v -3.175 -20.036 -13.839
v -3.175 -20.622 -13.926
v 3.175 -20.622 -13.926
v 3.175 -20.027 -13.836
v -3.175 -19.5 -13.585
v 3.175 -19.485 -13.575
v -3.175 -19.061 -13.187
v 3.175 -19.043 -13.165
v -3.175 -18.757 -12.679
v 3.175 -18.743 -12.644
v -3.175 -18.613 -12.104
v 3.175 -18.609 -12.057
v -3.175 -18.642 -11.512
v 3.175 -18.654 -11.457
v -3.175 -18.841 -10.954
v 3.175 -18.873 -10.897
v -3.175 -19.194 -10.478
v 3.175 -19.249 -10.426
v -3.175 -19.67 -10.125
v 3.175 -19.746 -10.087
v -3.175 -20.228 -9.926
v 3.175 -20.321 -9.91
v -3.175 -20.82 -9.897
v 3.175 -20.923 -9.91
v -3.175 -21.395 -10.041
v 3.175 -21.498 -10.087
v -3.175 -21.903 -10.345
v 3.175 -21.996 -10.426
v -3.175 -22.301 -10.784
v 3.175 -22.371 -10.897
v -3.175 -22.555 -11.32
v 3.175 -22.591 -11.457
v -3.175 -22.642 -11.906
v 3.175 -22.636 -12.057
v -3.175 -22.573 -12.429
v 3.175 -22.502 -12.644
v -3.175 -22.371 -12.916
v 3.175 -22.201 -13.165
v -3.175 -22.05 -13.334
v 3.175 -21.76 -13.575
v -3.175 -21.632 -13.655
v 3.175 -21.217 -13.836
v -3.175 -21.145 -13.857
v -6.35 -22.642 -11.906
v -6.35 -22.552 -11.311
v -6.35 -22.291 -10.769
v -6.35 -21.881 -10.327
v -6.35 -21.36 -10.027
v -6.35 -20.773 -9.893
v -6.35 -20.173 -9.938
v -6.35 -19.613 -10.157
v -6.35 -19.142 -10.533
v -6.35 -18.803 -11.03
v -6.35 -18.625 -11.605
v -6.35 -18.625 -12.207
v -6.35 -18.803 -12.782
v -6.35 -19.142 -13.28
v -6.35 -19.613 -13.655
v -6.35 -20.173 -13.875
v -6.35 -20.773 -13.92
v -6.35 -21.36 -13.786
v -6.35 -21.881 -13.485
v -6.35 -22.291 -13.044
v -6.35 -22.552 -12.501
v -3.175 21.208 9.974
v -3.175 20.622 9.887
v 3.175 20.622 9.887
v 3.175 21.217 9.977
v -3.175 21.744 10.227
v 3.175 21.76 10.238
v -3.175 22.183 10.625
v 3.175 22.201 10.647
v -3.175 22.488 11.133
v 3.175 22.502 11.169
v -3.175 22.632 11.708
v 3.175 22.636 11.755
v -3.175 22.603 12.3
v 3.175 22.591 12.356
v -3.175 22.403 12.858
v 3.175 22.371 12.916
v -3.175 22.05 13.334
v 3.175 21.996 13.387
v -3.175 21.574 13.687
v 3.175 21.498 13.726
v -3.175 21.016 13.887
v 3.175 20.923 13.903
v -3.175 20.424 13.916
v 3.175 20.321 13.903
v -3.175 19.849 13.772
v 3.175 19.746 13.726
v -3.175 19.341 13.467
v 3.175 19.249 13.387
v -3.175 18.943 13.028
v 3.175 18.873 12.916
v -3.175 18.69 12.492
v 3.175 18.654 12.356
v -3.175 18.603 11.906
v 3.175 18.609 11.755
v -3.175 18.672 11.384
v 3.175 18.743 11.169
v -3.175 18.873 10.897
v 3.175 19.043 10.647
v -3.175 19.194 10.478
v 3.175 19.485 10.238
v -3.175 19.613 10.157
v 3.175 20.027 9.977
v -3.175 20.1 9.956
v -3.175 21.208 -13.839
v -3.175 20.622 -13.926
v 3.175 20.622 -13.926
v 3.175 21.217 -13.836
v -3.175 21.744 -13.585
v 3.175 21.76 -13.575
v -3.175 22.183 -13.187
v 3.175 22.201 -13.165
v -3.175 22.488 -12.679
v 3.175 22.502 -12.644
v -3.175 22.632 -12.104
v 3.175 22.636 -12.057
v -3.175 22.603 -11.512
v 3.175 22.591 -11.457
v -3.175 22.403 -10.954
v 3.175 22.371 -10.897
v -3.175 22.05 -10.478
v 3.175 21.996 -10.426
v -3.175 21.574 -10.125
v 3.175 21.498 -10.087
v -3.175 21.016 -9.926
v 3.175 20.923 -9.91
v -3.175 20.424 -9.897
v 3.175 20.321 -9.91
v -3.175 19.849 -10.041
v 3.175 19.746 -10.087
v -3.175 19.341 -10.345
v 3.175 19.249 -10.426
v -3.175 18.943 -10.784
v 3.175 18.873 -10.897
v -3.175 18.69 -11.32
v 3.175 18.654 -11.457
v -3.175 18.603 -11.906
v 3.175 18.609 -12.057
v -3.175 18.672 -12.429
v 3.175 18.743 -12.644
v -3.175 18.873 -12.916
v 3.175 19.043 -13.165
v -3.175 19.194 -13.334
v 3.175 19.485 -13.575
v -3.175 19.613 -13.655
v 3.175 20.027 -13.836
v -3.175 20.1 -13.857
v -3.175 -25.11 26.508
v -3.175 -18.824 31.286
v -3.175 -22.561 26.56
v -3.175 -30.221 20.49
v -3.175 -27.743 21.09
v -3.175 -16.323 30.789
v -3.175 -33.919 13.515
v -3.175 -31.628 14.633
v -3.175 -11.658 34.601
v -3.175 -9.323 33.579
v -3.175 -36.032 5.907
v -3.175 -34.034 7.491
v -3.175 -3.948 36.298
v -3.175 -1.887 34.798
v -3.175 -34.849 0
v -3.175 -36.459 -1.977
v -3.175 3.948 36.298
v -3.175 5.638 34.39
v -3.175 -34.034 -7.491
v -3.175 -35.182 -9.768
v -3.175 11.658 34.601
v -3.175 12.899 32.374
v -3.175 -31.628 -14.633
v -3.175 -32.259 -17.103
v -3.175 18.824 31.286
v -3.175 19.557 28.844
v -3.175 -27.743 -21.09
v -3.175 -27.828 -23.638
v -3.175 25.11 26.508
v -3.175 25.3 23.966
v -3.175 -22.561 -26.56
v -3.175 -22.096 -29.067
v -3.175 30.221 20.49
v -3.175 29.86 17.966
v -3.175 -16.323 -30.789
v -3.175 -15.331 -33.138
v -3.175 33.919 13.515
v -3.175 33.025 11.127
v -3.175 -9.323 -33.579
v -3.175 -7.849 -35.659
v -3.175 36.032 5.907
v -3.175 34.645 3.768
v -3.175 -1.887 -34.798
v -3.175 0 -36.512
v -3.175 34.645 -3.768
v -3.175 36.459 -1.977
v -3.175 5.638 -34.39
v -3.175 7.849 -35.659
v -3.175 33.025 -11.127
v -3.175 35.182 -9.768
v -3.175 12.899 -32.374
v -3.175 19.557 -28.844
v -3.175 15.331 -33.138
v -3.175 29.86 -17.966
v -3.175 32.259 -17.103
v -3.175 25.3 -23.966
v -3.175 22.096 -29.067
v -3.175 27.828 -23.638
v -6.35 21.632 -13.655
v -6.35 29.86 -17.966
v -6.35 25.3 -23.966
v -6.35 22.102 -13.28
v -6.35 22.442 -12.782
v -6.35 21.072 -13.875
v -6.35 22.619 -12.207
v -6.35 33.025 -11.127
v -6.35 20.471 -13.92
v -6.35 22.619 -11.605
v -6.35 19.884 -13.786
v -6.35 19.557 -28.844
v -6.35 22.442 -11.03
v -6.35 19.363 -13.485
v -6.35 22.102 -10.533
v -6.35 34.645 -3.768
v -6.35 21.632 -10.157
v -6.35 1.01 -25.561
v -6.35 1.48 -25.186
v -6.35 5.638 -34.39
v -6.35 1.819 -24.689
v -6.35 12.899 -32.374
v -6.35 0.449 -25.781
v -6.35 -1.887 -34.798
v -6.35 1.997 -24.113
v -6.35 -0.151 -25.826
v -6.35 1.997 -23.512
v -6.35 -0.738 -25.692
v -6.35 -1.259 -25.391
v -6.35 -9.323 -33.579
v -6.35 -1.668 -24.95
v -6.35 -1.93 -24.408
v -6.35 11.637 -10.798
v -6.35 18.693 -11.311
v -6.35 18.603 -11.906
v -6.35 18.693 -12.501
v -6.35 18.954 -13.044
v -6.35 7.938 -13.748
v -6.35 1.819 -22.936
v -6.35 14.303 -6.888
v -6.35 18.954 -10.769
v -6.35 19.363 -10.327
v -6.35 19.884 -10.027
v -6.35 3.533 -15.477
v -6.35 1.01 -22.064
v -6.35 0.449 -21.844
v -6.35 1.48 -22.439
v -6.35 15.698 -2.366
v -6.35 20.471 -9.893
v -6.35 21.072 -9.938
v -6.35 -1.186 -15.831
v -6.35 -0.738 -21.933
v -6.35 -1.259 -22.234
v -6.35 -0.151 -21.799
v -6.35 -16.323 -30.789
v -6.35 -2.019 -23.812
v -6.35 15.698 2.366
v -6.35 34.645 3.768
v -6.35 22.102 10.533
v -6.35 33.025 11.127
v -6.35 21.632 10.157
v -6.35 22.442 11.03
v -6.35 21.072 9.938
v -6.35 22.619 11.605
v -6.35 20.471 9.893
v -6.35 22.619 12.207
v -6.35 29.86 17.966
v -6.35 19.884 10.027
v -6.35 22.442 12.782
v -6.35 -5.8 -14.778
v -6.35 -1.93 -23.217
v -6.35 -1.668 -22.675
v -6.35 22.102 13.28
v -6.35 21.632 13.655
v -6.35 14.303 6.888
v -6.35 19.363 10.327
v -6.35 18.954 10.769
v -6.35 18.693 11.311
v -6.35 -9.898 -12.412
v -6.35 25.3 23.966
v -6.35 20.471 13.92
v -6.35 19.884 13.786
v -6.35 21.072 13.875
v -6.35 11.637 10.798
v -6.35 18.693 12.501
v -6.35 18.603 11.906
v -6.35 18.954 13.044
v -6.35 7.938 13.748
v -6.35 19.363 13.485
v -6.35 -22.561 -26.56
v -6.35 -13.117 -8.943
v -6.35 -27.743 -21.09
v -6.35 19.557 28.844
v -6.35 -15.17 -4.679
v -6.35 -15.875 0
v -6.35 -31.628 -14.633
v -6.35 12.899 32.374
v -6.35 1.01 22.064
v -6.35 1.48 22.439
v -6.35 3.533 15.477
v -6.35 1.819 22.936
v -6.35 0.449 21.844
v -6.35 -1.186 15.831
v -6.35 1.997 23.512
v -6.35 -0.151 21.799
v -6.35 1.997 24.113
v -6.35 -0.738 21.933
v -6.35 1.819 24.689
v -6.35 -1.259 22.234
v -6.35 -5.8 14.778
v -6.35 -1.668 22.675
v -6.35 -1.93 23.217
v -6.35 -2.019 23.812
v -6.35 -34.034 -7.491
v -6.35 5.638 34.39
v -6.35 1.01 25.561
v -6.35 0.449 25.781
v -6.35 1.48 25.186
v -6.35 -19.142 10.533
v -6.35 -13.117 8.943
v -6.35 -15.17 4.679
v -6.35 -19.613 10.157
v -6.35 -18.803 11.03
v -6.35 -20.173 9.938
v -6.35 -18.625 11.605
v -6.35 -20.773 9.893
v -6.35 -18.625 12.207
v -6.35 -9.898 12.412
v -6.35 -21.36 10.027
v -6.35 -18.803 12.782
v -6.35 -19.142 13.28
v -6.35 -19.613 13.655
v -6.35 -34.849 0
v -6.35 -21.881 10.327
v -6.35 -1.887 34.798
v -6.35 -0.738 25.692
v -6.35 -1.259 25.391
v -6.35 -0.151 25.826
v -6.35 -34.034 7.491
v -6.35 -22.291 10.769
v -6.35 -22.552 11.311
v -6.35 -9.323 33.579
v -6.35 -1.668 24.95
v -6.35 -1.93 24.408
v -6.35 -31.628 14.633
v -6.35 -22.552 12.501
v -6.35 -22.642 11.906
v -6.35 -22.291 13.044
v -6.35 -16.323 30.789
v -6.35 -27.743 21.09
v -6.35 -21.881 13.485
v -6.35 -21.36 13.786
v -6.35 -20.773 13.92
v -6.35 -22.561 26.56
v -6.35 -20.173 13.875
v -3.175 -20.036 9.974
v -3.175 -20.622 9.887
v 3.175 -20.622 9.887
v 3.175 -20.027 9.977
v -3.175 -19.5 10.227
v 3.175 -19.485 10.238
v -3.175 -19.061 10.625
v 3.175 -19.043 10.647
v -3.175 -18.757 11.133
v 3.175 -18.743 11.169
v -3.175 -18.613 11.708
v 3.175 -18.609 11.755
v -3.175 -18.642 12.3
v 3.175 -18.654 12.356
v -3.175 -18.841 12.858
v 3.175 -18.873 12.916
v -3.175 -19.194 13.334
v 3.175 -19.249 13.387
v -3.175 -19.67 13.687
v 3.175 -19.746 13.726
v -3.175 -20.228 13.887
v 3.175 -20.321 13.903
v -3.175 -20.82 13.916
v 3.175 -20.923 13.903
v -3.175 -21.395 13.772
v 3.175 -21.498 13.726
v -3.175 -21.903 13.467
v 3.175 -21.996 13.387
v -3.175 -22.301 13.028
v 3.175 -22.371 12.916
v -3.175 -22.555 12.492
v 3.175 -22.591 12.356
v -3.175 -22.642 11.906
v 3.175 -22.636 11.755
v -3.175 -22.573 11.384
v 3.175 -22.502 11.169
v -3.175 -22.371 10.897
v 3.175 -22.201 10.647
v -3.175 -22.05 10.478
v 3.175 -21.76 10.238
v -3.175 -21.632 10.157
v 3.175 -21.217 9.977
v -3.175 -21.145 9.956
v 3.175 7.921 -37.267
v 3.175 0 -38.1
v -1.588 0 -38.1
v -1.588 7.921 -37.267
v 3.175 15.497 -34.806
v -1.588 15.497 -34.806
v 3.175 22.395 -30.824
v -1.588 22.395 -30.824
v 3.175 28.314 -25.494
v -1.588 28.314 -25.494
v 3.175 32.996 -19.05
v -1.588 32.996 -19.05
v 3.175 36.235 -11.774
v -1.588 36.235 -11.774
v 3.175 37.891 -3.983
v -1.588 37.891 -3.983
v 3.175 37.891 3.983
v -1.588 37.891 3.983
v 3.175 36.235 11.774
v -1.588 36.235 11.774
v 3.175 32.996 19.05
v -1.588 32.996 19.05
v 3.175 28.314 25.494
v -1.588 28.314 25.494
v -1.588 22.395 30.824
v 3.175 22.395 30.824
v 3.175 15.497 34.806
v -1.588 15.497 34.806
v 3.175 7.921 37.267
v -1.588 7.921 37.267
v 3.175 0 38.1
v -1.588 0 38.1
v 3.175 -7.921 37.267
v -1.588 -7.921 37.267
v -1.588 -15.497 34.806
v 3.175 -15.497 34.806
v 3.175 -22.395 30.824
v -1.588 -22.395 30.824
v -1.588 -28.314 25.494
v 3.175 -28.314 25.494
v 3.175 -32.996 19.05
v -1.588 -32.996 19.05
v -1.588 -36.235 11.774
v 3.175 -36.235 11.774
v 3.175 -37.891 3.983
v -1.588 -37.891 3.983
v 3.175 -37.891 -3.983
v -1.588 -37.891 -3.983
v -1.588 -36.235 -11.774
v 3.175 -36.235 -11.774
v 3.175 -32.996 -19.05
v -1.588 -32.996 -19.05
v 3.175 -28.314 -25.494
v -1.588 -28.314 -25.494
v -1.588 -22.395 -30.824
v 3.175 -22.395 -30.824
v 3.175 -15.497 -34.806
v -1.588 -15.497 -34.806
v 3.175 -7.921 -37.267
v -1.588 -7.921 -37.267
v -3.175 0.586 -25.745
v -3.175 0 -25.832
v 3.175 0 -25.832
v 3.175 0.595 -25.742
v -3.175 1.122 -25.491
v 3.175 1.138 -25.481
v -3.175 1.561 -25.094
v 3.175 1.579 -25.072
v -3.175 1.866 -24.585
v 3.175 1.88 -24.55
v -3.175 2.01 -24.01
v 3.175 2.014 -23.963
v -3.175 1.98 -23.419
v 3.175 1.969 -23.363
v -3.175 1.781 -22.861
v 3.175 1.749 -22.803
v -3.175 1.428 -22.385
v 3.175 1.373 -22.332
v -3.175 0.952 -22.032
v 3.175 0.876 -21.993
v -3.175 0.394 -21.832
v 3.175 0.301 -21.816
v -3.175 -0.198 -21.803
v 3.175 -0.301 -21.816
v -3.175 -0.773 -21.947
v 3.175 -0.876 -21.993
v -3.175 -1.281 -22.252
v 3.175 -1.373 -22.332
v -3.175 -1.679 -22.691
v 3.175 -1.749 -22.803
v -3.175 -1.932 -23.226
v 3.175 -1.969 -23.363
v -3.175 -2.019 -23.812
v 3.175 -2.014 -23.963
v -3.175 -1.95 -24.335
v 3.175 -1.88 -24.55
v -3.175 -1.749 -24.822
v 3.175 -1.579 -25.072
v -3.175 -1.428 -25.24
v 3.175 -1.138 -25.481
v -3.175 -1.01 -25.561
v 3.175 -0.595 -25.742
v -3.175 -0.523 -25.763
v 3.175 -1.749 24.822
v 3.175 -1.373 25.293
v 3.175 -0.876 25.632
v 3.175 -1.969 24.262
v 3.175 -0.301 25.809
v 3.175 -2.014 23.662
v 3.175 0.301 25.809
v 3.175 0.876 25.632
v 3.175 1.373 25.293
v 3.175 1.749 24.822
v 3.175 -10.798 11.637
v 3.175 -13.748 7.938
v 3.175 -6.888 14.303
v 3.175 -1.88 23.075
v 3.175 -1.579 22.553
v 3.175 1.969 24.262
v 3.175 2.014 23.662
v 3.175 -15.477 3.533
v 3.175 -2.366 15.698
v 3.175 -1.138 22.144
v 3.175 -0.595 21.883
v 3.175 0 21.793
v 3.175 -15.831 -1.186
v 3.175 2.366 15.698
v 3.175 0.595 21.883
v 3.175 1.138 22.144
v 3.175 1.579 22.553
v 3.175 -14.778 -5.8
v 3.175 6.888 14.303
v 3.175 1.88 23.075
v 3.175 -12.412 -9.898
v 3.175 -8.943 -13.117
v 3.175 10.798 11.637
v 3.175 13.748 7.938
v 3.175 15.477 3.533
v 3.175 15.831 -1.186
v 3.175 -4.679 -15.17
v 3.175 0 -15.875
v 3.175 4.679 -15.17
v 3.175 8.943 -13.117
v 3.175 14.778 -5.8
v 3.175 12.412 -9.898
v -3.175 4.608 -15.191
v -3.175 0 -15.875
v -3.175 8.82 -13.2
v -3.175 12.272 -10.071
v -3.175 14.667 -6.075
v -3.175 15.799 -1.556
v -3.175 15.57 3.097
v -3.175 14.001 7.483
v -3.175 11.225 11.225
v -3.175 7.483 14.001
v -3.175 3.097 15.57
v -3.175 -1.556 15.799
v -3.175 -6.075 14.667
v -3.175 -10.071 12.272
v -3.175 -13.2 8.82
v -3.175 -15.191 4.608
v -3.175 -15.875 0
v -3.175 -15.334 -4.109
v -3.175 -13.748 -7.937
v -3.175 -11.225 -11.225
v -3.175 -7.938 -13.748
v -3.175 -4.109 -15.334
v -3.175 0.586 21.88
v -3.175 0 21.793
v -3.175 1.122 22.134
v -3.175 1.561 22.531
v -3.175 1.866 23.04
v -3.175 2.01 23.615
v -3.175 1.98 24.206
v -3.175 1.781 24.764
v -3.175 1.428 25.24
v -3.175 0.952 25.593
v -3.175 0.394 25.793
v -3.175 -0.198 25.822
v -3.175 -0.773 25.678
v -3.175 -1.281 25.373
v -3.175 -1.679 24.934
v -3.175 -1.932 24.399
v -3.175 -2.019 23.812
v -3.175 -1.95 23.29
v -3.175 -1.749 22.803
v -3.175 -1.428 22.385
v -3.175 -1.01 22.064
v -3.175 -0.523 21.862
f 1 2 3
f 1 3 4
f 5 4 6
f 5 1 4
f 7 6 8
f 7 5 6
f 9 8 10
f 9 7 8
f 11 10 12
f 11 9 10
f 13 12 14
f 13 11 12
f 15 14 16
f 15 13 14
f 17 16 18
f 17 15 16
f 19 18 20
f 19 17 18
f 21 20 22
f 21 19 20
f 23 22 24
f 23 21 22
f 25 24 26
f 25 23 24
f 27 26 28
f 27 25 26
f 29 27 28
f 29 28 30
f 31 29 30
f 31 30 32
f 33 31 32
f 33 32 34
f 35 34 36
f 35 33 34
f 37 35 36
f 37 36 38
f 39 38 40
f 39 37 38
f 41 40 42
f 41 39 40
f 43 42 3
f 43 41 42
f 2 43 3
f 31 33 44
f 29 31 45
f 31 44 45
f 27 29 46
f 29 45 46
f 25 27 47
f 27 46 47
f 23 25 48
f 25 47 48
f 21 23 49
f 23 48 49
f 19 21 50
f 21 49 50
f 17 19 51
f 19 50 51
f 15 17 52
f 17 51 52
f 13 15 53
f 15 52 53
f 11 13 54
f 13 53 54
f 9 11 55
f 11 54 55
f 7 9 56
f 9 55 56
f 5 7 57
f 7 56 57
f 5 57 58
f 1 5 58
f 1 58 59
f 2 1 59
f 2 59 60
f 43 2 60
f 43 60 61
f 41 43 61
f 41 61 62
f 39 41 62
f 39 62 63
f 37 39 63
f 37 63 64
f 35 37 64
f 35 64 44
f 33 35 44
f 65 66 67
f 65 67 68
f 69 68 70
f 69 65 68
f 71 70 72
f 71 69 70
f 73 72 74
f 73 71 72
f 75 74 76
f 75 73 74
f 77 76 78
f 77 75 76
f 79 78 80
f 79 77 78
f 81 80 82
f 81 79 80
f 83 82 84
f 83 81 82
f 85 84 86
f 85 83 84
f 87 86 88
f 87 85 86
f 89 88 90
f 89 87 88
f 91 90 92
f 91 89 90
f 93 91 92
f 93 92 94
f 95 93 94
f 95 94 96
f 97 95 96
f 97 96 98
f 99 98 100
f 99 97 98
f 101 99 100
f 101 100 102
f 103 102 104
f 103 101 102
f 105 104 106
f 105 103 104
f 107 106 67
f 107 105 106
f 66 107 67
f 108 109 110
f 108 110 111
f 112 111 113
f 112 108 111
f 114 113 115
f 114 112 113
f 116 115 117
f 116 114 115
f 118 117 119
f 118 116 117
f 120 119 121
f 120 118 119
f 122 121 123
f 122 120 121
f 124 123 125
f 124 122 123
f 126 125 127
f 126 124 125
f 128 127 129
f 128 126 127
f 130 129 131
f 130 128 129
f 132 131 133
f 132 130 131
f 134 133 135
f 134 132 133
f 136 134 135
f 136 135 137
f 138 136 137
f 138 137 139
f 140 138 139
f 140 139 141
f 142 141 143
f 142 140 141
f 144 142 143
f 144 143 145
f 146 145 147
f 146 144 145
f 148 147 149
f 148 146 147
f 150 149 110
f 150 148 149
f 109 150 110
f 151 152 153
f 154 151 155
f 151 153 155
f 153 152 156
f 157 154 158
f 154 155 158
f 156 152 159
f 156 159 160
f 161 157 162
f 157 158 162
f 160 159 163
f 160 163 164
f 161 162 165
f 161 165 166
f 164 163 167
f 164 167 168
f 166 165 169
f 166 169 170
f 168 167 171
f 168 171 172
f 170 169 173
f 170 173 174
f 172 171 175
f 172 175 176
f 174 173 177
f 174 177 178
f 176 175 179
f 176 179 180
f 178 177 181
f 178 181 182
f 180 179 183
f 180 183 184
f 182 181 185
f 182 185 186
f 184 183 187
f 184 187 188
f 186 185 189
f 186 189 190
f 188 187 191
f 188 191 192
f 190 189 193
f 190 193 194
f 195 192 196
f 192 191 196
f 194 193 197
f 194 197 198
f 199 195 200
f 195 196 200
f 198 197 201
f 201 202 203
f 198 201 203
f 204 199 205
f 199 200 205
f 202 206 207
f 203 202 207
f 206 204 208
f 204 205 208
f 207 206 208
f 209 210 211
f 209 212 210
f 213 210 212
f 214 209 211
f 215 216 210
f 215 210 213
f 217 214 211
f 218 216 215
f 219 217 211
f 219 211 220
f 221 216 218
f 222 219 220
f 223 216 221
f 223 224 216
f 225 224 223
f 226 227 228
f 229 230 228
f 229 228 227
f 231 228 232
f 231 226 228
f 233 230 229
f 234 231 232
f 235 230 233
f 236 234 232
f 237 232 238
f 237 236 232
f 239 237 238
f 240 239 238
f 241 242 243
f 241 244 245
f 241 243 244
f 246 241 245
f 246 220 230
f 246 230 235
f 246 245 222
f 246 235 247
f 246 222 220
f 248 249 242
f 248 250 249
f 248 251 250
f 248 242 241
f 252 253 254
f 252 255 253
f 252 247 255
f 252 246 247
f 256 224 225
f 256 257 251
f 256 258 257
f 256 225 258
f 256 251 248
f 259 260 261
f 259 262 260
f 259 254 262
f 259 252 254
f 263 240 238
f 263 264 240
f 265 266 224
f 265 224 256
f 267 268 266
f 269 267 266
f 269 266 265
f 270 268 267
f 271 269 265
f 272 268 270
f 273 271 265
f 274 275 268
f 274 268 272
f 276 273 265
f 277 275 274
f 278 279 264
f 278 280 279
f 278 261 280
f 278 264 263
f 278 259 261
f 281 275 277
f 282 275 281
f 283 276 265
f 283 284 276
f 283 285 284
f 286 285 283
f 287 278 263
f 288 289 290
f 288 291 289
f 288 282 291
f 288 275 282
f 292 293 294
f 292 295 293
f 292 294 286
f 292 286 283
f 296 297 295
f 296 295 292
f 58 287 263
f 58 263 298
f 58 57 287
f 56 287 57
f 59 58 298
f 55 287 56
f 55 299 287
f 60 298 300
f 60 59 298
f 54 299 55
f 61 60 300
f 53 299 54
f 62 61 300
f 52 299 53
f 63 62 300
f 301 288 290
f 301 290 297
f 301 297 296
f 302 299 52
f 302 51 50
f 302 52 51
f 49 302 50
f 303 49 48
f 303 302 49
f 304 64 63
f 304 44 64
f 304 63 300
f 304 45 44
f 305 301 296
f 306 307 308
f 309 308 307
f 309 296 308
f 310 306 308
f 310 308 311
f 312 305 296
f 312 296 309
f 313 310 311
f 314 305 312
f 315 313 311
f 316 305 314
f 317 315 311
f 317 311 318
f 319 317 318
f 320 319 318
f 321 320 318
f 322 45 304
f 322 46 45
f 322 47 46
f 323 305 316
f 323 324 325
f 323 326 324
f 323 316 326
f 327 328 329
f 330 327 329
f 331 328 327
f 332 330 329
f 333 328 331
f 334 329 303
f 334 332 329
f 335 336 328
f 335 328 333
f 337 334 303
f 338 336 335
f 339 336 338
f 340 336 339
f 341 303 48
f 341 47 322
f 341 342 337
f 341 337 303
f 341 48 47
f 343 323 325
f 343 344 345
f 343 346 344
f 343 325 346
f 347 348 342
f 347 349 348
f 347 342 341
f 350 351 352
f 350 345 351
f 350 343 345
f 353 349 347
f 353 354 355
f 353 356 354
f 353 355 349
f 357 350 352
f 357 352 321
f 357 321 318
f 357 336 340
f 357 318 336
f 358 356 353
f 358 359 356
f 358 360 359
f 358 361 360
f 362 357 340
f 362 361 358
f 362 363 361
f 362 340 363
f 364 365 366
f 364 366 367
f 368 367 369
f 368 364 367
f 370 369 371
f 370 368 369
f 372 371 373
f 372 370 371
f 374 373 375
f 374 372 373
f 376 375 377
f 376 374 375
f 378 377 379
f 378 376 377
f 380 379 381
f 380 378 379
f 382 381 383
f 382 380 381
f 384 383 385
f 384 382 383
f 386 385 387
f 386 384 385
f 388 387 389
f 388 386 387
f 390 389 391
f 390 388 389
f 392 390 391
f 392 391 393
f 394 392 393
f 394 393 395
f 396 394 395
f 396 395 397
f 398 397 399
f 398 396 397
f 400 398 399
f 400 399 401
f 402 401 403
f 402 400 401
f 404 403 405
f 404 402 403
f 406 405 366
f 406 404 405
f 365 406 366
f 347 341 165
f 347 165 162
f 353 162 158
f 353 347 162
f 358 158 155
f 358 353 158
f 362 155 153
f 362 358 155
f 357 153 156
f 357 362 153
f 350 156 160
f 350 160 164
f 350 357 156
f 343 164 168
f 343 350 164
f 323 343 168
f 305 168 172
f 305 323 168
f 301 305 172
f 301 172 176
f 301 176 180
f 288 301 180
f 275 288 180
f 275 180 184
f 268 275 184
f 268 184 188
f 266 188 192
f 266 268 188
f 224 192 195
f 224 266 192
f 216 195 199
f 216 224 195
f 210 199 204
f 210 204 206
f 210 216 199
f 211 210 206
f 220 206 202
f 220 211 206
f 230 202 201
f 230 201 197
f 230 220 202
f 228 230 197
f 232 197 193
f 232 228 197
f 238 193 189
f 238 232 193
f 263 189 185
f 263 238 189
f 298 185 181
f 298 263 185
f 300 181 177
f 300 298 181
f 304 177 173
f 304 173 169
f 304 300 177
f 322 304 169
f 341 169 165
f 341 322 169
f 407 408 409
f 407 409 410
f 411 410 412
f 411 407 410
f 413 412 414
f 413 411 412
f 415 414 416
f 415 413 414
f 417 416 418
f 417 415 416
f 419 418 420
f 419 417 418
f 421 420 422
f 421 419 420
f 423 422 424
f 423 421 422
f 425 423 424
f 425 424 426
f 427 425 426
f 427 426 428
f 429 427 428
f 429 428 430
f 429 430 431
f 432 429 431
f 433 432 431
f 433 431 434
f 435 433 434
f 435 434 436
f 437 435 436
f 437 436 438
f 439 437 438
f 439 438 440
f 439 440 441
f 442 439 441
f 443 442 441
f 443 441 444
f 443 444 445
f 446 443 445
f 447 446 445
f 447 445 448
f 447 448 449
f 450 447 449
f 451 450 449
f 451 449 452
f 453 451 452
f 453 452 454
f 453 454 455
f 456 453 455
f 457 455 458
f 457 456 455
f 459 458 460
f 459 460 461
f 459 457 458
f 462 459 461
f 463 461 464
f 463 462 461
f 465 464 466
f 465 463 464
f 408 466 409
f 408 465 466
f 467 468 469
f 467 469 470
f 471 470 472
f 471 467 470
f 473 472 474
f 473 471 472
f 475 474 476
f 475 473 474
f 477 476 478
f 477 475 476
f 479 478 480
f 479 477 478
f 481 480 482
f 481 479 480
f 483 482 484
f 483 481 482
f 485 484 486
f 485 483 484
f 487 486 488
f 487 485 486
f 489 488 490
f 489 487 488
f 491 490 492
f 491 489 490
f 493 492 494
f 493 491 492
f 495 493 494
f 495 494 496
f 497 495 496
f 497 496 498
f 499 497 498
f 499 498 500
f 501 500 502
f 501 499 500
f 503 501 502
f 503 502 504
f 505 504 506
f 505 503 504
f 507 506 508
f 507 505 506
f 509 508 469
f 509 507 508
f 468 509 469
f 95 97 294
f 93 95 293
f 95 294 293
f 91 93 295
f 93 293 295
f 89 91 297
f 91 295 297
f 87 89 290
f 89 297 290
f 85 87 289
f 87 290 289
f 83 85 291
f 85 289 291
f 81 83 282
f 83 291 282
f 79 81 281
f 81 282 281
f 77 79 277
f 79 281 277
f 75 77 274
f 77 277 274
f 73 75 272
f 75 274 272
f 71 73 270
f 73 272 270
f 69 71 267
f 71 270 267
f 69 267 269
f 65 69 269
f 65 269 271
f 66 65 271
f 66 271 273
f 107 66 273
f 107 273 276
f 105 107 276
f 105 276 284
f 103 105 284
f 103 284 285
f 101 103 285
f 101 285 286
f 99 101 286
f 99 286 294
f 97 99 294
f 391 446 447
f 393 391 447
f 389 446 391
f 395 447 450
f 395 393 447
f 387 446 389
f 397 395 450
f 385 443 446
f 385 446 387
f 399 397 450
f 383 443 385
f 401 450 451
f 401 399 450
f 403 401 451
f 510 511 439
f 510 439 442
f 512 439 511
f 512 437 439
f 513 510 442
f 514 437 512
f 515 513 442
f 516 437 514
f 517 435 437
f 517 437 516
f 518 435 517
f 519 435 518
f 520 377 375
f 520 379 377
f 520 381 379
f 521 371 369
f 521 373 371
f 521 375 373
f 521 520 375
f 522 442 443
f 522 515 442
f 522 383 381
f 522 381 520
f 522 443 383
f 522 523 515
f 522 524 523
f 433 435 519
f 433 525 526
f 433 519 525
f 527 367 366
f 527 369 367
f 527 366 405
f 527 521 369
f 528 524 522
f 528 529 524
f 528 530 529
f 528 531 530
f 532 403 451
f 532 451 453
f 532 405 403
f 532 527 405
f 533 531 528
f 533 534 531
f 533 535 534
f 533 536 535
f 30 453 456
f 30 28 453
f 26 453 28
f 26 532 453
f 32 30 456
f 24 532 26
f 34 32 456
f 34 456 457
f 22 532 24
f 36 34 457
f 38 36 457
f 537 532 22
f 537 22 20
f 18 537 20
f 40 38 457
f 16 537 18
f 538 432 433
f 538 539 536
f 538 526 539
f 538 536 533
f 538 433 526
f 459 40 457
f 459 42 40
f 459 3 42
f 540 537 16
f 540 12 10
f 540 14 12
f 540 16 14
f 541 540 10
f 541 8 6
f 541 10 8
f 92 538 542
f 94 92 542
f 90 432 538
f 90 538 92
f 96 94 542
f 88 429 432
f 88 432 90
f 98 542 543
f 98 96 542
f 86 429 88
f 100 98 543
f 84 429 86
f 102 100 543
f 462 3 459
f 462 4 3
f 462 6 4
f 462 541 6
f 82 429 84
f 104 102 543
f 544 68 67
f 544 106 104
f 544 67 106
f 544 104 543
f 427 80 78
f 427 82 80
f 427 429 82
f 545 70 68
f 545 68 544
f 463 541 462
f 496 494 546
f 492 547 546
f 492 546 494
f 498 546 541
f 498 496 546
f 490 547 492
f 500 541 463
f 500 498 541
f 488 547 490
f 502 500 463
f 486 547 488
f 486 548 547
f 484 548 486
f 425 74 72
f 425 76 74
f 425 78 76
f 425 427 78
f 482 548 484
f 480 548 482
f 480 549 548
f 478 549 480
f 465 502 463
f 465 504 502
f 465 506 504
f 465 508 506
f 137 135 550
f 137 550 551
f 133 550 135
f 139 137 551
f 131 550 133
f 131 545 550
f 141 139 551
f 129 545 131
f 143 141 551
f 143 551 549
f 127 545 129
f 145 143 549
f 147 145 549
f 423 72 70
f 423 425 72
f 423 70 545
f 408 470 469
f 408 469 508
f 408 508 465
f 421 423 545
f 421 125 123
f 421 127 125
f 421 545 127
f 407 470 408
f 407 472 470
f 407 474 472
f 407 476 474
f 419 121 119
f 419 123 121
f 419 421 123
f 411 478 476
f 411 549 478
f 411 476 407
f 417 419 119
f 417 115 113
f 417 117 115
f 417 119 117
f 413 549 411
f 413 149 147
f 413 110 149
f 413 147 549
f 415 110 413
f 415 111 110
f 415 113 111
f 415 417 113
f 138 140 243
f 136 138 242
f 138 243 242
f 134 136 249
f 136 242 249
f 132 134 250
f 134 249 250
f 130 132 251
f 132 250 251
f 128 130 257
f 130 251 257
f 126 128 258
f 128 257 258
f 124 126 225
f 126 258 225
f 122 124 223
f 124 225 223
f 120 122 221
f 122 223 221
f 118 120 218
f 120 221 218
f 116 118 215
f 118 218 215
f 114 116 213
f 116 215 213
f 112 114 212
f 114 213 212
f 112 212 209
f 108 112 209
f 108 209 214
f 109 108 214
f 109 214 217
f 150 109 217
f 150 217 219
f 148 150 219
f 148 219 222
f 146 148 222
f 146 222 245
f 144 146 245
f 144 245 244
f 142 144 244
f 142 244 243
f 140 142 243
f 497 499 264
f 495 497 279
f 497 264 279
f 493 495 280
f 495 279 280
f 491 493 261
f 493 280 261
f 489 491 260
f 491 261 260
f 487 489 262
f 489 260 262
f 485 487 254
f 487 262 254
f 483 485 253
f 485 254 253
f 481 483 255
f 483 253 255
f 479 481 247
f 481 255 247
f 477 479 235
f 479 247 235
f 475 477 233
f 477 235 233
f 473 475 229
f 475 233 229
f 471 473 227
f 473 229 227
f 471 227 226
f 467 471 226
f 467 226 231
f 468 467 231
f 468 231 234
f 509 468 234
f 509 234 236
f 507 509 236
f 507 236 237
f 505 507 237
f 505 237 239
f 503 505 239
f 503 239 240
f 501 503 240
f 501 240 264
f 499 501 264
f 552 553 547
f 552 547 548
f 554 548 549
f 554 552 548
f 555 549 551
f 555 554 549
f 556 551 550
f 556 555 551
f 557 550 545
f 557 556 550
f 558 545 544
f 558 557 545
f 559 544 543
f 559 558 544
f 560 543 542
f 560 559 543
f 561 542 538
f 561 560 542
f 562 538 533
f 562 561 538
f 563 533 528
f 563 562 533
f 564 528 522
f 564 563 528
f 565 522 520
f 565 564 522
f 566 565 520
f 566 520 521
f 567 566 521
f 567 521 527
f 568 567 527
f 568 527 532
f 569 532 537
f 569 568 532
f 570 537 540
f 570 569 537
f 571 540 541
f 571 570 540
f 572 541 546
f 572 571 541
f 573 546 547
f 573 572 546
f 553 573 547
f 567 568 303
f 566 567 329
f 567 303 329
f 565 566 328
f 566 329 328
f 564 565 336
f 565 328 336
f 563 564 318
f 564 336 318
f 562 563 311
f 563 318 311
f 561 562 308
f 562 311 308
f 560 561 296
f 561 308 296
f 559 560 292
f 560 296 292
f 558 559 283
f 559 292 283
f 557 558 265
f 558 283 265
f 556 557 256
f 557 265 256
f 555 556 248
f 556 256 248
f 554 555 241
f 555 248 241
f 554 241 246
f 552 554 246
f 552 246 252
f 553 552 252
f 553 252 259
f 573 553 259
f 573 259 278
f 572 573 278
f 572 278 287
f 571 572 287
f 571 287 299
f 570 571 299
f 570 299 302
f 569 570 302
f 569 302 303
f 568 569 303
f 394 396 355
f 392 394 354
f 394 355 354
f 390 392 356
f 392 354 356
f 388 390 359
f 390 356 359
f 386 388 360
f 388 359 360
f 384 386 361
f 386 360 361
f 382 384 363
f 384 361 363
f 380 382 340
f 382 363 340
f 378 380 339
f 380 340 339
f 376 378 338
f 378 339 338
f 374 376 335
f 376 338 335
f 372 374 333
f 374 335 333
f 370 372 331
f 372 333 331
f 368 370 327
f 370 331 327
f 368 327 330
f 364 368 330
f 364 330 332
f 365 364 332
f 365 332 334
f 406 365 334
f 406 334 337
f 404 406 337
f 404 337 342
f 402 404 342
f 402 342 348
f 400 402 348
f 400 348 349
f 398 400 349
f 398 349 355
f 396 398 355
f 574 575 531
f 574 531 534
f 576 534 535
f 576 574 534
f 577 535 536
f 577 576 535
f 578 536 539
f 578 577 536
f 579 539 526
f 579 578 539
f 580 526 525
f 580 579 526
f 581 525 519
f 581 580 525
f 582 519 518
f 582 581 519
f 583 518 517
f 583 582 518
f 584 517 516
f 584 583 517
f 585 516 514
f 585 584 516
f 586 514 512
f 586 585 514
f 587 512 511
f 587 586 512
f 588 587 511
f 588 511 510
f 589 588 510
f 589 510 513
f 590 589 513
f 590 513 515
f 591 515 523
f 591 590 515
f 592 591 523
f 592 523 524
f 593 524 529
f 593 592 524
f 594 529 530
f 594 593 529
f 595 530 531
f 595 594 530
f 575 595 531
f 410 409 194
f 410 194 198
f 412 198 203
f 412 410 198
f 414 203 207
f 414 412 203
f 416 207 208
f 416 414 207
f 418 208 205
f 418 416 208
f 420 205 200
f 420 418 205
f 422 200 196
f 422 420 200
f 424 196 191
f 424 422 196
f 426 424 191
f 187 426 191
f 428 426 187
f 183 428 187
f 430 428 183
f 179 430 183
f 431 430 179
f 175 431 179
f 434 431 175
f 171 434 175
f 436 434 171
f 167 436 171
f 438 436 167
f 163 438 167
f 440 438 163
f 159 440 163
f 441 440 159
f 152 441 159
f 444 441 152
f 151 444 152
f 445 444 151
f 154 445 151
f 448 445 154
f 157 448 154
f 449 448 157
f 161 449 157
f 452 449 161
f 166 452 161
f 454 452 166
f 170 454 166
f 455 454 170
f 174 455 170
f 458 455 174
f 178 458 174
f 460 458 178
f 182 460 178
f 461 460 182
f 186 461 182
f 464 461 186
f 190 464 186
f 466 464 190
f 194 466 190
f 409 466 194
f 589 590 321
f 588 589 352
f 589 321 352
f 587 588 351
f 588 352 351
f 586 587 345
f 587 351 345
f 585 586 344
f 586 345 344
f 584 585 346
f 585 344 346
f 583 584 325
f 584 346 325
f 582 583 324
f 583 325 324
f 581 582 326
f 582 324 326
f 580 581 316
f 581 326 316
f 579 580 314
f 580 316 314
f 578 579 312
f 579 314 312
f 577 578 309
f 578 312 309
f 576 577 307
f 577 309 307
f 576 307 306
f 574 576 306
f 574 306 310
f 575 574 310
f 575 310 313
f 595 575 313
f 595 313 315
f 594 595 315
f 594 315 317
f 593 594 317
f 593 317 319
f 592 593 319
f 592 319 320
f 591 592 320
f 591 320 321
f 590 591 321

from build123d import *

# Parameters (mm, degrees)
SKETCH1_R           = 38.1
SKETCH1_R_2         = 15.875
SKETCH1_R_3         = 2.0193
BOSS_EXTRUDE1_DEPTH = 3.175
BOSS_EXTRUDE2_START = 3.175
SKETCH2_R           = 34.8488
SKETCH2_R_2         = 2.0193
SKETCH2_R_3         = 15.875
BOSS_EXTRUDE2_DEPTH = 3.175
CHAMFER1_SIZE       = 1.5875


with BuildPart() as part:
    # Sketch1 → Boss-Extrude1 (new, symmetric)
    with BuildSketch(Plane(origin=(0, 0, 0), x_dir=(0, 0, -1), z_dir=(1, 0, 0))):
        Circle(SKETCH1_R)
        Circle(SKETCH1_R_2, mode=Mode.SUBTRACT)
        with Locations((11.90625, 20.622229928)):
            Circle(SKETCH1_R_3, mode=Mode.SUBTRACT)
        with Locations((23.8125, 0)):
            Circle(SKETCH1_R_3, mode=Mode.SUBTRACT)
        with Locations((11.90625, -20.622229928)):
            Circle(SKETCH1_R_3, mode=Mode.SUBTRACT)
        with Locations((-11.90625, -20.622229928)):
            Circle(SKETCH1_R_3, mode=Mode.SUBTRACT)
        with Locations((-23.8125, 0)):
            Circle(SKETCH1_R_3, mode=Mode.SUBTRACT)
        with Locations((-11.90625, 20.622229928)):
            Circle(SKETCH1_R_3, mode=Mode.SUBTRACT)
    extrude(amount=BOSS_EXTRUDE1_DEPTH, both=True)

    # Sketch2 → Boss-Extrude2 (add)
    with BuildSketch(Plane.ZY.offset(3.175).offset(BOSS_EXTRUDE2_START)):
        with Locations(Location((0, 0, 0), (0, 0, 270))):
            Circle(SKETCH2_R)
        with Locations(Location((-11.90625, 20.622229928, 0), (0, 0, 270))):
            Circle(SKETCH2_R_2, mode=Mode.SUBTRACT)
        with Locations(Location((-11.90625, -20.622229928, 0), (0, 0, 270))):
            Circle(SKETCH2_R_2, mode=Mode.SUBTRACT)
        with Locations(Location((23.8125, 0, 0), (0, 0, 270))):
            Circle(SKETCH2_R_2, mode=Mode.SUBTRACT)
        with Locations(Location((11.90625, 20.622229928, 0), (0, 0, 270))):
            Circle(SKETCH2_R_2, mode=Mode.SUBTRACT)
        with Locations(Location((11.90625, -20.622229928, 0), (0, 0, 270))):
            Circle(SKETCH2_R_2, mode=Mode.SUBTRACT)
        with Locations(Location((-23.8125, 0, 0), (0, 0, 270))):
            Circle(SKETCH2_R_2, mode=Mode.SUBTRACT)
        with Locations(Location((0, 0, 0), (0, 0, 270))):
            Circle(SKETCH2_R_3, mode=Mode.SUBTRACT)
    extrude(amount=-BOSS_EXTRUDE2_DEPTH)

    # Chamfer1
    chamfer1_edges = [part.edges().sort_by_distance(p)[0] for p in [
        (-3.175, 0, 38.1),
    ]]
    chamfer(chamfer1_edges, length=CHAMFER1_SIZE)


solid = part.part
